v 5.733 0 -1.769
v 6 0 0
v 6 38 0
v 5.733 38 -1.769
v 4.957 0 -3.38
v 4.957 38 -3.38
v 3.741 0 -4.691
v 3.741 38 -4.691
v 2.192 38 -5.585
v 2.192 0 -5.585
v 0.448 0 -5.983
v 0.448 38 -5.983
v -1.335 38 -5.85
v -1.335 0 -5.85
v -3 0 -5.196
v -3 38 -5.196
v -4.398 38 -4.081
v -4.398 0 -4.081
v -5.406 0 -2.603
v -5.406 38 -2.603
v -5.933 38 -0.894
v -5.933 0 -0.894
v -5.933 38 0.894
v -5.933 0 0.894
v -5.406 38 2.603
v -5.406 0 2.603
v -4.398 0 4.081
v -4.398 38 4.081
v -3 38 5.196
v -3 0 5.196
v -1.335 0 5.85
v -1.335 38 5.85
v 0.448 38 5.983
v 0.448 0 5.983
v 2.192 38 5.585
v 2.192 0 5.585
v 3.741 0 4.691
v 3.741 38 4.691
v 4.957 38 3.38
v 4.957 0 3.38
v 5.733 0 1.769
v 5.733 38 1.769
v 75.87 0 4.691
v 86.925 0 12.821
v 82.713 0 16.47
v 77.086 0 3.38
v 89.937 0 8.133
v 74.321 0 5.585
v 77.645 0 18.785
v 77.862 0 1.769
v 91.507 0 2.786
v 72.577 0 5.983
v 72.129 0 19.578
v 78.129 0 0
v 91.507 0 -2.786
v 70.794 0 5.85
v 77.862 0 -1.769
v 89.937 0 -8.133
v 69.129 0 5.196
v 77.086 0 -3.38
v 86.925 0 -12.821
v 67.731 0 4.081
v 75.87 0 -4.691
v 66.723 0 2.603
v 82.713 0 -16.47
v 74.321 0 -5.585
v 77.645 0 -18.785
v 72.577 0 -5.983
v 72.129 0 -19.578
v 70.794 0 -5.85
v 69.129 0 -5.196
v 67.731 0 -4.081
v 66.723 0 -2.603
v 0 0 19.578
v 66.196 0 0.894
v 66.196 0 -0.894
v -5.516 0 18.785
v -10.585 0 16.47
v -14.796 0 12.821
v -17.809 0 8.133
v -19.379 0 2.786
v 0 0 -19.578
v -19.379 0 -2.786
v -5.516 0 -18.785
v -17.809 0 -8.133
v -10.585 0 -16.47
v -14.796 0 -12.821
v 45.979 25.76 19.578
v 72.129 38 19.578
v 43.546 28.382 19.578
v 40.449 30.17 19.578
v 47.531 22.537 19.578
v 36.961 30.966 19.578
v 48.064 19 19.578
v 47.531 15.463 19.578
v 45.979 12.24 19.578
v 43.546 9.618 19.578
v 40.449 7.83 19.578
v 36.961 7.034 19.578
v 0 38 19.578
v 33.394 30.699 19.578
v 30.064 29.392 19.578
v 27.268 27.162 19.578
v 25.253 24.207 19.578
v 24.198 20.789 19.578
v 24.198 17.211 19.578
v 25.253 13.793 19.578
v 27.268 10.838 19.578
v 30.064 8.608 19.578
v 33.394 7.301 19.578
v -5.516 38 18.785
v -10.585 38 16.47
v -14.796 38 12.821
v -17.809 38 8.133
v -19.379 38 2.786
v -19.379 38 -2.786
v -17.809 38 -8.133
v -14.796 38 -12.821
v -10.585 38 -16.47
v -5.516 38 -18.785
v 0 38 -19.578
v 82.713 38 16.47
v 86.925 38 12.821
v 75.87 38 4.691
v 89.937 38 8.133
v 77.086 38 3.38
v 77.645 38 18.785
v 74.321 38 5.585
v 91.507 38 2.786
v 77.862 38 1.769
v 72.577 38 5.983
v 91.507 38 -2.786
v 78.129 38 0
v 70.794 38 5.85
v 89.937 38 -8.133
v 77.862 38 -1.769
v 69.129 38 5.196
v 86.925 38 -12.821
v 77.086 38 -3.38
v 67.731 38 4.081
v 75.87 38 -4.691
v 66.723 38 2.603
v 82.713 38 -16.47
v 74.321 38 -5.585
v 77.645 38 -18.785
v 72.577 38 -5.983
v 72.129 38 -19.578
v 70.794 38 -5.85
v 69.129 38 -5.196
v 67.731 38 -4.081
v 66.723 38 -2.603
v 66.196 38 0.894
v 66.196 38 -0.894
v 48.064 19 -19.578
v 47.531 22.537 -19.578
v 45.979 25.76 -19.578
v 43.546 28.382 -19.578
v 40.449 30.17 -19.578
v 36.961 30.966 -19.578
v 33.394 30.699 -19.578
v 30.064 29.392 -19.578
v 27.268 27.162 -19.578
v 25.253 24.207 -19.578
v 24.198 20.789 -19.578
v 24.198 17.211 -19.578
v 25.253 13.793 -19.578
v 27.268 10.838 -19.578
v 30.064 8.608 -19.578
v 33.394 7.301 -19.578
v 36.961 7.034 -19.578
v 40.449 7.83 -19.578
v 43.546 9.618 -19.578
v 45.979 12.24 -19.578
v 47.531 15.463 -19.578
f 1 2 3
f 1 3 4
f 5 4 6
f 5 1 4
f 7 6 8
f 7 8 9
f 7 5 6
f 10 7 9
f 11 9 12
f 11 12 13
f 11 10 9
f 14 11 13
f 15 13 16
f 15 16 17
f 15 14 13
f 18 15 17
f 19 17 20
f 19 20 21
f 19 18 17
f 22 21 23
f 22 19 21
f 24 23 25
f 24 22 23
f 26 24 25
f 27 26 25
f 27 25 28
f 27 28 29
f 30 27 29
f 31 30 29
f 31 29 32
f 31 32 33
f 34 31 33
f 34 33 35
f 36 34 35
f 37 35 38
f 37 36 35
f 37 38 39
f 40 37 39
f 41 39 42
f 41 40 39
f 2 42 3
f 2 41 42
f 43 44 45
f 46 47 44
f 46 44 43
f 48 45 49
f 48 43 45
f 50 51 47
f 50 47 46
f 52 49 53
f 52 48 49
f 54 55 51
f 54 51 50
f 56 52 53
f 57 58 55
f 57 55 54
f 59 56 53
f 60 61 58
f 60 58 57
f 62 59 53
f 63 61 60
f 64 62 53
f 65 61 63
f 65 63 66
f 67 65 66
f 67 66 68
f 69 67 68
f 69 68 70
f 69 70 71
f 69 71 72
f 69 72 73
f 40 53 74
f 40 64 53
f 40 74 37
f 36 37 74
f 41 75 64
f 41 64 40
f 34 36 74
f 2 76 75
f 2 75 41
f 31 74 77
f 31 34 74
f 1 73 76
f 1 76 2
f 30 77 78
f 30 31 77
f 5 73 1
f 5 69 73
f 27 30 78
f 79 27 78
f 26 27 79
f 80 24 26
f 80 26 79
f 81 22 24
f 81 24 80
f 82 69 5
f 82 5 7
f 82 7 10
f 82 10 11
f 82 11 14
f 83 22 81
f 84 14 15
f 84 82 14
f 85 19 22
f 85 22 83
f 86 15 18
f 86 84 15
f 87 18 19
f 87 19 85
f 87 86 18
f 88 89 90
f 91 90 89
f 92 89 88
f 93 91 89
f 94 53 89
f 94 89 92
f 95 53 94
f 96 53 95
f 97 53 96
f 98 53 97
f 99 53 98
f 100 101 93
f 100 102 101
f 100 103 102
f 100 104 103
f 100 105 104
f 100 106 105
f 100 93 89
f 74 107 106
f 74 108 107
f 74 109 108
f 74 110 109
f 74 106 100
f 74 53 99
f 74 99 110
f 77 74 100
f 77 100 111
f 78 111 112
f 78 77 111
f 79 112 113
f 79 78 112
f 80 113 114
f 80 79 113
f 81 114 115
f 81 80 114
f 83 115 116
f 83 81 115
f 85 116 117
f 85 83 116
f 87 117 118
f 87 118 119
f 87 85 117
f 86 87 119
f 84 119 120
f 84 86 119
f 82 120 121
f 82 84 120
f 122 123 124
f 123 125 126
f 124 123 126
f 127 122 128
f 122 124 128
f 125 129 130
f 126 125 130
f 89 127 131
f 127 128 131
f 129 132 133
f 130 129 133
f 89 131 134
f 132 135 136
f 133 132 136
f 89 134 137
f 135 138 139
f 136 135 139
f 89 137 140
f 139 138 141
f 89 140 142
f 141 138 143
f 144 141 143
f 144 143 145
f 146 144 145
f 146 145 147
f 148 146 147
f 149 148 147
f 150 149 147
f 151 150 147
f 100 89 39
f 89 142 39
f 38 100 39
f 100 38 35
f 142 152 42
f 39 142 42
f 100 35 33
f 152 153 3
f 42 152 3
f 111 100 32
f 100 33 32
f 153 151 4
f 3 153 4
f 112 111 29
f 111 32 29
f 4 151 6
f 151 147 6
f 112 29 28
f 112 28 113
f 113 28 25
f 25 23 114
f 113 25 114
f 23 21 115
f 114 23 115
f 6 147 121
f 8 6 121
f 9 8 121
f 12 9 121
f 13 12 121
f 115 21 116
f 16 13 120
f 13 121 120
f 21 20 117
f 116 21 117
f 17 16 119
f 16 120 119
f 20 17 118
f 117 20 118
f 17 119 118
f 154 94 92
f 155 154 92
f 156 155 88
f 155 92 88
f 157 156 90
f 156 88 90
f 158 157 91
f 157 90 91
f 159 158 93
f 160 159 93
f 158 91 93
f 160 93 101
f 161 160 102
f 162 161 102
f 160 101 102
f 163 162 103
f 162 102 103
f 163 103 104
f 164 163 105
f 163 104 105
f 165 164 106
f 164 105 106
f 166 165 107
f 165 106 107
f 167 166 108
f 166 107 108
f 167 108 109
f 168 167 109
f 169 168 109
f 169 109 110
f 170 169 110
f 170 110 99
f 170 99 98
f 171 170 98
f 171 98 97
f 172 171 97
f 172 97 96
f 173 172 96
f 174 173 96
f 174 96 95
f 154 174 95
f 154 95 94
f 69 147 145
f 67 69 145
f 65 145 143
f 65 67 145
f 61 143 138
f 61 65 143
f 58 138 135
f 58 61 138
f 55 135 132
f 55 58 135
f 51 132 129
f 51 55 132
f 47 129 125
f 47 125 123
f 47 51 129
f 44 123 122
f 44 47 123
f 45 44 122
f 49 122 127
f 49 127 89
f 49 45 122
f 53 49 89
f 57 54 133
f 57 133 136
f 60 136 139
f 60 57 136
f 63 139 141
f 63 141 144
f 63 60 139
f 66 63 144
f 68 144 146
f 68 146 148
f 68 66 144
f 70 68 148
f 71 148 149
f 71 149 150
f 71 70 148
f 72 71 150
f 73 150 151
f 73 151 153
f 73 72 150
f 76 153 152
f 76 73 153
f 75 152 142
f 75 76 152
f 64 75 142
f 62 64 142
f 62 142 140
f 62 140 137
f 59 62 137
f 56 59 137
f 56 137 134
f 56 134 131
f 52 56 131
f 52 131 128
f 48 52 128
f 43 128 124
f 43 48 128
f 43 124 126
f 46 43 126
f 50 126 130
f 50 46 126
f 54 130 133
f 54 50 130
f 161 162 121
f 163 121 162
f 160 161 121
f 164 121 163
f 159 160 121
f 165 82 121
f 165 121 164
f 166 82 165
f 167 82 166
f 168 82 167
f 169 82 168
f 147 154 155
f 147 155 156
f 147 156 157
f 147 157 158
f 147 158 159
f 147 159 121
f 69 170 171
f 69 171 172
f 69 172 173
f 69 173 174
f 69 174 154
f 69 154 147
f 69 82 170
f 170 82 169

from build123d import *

# Parameters (mm, degrees)
SKETCH1_R           = 6
BOSS_EXTRUDE1_DEPTH = 38
SKETCH3_R           = 12
CUT_EXTRUDE2_DEPTH  = 98


with BuildPart() as part:
    # Sketch1 → Boss-Extrude1 (new body)
    with BuildSketch(Plane(origin=(0, 0, 0), x_dir=(1, 0, 0), z_dir=(0, 1, 0))):
        with BuildLine():
            Line((0, 19.577833845), (72.128861533, 19.577833845))
            ThreePointArc((72.128861533, 19.577833845), (91.706695377, 0), (72.128861533, -19.577833845))
            Line((72.128861533, -19.577833845), (0, -19.577833845))
            ThreePointArc((0, -19.577833845), (-19.577833845, 0), (0, 19.577833845))
        make_face()
        Circle(SKETCH1_R, mode=Mode.SUBTRACT)
        with Locations((72.128861533, 0)):
            Circle(SKETCH1_R, mode=Mode.SUBTRACT)
    extrude(amount=BOSS_EXTRUDE1_DEPTH)

    # Sketch3 → Cut-Extrude2 (cut)
    with BuildSketch(Plane.XY.offset(19.577833845)):
        with Locations((36.064430766, 19)):
            Circle(SKETCH3_R)
    extrude(amount=-CUT_EXTRUDE2_DEPTH, mode=Mode.SUBTRACT)


solid = part.part
